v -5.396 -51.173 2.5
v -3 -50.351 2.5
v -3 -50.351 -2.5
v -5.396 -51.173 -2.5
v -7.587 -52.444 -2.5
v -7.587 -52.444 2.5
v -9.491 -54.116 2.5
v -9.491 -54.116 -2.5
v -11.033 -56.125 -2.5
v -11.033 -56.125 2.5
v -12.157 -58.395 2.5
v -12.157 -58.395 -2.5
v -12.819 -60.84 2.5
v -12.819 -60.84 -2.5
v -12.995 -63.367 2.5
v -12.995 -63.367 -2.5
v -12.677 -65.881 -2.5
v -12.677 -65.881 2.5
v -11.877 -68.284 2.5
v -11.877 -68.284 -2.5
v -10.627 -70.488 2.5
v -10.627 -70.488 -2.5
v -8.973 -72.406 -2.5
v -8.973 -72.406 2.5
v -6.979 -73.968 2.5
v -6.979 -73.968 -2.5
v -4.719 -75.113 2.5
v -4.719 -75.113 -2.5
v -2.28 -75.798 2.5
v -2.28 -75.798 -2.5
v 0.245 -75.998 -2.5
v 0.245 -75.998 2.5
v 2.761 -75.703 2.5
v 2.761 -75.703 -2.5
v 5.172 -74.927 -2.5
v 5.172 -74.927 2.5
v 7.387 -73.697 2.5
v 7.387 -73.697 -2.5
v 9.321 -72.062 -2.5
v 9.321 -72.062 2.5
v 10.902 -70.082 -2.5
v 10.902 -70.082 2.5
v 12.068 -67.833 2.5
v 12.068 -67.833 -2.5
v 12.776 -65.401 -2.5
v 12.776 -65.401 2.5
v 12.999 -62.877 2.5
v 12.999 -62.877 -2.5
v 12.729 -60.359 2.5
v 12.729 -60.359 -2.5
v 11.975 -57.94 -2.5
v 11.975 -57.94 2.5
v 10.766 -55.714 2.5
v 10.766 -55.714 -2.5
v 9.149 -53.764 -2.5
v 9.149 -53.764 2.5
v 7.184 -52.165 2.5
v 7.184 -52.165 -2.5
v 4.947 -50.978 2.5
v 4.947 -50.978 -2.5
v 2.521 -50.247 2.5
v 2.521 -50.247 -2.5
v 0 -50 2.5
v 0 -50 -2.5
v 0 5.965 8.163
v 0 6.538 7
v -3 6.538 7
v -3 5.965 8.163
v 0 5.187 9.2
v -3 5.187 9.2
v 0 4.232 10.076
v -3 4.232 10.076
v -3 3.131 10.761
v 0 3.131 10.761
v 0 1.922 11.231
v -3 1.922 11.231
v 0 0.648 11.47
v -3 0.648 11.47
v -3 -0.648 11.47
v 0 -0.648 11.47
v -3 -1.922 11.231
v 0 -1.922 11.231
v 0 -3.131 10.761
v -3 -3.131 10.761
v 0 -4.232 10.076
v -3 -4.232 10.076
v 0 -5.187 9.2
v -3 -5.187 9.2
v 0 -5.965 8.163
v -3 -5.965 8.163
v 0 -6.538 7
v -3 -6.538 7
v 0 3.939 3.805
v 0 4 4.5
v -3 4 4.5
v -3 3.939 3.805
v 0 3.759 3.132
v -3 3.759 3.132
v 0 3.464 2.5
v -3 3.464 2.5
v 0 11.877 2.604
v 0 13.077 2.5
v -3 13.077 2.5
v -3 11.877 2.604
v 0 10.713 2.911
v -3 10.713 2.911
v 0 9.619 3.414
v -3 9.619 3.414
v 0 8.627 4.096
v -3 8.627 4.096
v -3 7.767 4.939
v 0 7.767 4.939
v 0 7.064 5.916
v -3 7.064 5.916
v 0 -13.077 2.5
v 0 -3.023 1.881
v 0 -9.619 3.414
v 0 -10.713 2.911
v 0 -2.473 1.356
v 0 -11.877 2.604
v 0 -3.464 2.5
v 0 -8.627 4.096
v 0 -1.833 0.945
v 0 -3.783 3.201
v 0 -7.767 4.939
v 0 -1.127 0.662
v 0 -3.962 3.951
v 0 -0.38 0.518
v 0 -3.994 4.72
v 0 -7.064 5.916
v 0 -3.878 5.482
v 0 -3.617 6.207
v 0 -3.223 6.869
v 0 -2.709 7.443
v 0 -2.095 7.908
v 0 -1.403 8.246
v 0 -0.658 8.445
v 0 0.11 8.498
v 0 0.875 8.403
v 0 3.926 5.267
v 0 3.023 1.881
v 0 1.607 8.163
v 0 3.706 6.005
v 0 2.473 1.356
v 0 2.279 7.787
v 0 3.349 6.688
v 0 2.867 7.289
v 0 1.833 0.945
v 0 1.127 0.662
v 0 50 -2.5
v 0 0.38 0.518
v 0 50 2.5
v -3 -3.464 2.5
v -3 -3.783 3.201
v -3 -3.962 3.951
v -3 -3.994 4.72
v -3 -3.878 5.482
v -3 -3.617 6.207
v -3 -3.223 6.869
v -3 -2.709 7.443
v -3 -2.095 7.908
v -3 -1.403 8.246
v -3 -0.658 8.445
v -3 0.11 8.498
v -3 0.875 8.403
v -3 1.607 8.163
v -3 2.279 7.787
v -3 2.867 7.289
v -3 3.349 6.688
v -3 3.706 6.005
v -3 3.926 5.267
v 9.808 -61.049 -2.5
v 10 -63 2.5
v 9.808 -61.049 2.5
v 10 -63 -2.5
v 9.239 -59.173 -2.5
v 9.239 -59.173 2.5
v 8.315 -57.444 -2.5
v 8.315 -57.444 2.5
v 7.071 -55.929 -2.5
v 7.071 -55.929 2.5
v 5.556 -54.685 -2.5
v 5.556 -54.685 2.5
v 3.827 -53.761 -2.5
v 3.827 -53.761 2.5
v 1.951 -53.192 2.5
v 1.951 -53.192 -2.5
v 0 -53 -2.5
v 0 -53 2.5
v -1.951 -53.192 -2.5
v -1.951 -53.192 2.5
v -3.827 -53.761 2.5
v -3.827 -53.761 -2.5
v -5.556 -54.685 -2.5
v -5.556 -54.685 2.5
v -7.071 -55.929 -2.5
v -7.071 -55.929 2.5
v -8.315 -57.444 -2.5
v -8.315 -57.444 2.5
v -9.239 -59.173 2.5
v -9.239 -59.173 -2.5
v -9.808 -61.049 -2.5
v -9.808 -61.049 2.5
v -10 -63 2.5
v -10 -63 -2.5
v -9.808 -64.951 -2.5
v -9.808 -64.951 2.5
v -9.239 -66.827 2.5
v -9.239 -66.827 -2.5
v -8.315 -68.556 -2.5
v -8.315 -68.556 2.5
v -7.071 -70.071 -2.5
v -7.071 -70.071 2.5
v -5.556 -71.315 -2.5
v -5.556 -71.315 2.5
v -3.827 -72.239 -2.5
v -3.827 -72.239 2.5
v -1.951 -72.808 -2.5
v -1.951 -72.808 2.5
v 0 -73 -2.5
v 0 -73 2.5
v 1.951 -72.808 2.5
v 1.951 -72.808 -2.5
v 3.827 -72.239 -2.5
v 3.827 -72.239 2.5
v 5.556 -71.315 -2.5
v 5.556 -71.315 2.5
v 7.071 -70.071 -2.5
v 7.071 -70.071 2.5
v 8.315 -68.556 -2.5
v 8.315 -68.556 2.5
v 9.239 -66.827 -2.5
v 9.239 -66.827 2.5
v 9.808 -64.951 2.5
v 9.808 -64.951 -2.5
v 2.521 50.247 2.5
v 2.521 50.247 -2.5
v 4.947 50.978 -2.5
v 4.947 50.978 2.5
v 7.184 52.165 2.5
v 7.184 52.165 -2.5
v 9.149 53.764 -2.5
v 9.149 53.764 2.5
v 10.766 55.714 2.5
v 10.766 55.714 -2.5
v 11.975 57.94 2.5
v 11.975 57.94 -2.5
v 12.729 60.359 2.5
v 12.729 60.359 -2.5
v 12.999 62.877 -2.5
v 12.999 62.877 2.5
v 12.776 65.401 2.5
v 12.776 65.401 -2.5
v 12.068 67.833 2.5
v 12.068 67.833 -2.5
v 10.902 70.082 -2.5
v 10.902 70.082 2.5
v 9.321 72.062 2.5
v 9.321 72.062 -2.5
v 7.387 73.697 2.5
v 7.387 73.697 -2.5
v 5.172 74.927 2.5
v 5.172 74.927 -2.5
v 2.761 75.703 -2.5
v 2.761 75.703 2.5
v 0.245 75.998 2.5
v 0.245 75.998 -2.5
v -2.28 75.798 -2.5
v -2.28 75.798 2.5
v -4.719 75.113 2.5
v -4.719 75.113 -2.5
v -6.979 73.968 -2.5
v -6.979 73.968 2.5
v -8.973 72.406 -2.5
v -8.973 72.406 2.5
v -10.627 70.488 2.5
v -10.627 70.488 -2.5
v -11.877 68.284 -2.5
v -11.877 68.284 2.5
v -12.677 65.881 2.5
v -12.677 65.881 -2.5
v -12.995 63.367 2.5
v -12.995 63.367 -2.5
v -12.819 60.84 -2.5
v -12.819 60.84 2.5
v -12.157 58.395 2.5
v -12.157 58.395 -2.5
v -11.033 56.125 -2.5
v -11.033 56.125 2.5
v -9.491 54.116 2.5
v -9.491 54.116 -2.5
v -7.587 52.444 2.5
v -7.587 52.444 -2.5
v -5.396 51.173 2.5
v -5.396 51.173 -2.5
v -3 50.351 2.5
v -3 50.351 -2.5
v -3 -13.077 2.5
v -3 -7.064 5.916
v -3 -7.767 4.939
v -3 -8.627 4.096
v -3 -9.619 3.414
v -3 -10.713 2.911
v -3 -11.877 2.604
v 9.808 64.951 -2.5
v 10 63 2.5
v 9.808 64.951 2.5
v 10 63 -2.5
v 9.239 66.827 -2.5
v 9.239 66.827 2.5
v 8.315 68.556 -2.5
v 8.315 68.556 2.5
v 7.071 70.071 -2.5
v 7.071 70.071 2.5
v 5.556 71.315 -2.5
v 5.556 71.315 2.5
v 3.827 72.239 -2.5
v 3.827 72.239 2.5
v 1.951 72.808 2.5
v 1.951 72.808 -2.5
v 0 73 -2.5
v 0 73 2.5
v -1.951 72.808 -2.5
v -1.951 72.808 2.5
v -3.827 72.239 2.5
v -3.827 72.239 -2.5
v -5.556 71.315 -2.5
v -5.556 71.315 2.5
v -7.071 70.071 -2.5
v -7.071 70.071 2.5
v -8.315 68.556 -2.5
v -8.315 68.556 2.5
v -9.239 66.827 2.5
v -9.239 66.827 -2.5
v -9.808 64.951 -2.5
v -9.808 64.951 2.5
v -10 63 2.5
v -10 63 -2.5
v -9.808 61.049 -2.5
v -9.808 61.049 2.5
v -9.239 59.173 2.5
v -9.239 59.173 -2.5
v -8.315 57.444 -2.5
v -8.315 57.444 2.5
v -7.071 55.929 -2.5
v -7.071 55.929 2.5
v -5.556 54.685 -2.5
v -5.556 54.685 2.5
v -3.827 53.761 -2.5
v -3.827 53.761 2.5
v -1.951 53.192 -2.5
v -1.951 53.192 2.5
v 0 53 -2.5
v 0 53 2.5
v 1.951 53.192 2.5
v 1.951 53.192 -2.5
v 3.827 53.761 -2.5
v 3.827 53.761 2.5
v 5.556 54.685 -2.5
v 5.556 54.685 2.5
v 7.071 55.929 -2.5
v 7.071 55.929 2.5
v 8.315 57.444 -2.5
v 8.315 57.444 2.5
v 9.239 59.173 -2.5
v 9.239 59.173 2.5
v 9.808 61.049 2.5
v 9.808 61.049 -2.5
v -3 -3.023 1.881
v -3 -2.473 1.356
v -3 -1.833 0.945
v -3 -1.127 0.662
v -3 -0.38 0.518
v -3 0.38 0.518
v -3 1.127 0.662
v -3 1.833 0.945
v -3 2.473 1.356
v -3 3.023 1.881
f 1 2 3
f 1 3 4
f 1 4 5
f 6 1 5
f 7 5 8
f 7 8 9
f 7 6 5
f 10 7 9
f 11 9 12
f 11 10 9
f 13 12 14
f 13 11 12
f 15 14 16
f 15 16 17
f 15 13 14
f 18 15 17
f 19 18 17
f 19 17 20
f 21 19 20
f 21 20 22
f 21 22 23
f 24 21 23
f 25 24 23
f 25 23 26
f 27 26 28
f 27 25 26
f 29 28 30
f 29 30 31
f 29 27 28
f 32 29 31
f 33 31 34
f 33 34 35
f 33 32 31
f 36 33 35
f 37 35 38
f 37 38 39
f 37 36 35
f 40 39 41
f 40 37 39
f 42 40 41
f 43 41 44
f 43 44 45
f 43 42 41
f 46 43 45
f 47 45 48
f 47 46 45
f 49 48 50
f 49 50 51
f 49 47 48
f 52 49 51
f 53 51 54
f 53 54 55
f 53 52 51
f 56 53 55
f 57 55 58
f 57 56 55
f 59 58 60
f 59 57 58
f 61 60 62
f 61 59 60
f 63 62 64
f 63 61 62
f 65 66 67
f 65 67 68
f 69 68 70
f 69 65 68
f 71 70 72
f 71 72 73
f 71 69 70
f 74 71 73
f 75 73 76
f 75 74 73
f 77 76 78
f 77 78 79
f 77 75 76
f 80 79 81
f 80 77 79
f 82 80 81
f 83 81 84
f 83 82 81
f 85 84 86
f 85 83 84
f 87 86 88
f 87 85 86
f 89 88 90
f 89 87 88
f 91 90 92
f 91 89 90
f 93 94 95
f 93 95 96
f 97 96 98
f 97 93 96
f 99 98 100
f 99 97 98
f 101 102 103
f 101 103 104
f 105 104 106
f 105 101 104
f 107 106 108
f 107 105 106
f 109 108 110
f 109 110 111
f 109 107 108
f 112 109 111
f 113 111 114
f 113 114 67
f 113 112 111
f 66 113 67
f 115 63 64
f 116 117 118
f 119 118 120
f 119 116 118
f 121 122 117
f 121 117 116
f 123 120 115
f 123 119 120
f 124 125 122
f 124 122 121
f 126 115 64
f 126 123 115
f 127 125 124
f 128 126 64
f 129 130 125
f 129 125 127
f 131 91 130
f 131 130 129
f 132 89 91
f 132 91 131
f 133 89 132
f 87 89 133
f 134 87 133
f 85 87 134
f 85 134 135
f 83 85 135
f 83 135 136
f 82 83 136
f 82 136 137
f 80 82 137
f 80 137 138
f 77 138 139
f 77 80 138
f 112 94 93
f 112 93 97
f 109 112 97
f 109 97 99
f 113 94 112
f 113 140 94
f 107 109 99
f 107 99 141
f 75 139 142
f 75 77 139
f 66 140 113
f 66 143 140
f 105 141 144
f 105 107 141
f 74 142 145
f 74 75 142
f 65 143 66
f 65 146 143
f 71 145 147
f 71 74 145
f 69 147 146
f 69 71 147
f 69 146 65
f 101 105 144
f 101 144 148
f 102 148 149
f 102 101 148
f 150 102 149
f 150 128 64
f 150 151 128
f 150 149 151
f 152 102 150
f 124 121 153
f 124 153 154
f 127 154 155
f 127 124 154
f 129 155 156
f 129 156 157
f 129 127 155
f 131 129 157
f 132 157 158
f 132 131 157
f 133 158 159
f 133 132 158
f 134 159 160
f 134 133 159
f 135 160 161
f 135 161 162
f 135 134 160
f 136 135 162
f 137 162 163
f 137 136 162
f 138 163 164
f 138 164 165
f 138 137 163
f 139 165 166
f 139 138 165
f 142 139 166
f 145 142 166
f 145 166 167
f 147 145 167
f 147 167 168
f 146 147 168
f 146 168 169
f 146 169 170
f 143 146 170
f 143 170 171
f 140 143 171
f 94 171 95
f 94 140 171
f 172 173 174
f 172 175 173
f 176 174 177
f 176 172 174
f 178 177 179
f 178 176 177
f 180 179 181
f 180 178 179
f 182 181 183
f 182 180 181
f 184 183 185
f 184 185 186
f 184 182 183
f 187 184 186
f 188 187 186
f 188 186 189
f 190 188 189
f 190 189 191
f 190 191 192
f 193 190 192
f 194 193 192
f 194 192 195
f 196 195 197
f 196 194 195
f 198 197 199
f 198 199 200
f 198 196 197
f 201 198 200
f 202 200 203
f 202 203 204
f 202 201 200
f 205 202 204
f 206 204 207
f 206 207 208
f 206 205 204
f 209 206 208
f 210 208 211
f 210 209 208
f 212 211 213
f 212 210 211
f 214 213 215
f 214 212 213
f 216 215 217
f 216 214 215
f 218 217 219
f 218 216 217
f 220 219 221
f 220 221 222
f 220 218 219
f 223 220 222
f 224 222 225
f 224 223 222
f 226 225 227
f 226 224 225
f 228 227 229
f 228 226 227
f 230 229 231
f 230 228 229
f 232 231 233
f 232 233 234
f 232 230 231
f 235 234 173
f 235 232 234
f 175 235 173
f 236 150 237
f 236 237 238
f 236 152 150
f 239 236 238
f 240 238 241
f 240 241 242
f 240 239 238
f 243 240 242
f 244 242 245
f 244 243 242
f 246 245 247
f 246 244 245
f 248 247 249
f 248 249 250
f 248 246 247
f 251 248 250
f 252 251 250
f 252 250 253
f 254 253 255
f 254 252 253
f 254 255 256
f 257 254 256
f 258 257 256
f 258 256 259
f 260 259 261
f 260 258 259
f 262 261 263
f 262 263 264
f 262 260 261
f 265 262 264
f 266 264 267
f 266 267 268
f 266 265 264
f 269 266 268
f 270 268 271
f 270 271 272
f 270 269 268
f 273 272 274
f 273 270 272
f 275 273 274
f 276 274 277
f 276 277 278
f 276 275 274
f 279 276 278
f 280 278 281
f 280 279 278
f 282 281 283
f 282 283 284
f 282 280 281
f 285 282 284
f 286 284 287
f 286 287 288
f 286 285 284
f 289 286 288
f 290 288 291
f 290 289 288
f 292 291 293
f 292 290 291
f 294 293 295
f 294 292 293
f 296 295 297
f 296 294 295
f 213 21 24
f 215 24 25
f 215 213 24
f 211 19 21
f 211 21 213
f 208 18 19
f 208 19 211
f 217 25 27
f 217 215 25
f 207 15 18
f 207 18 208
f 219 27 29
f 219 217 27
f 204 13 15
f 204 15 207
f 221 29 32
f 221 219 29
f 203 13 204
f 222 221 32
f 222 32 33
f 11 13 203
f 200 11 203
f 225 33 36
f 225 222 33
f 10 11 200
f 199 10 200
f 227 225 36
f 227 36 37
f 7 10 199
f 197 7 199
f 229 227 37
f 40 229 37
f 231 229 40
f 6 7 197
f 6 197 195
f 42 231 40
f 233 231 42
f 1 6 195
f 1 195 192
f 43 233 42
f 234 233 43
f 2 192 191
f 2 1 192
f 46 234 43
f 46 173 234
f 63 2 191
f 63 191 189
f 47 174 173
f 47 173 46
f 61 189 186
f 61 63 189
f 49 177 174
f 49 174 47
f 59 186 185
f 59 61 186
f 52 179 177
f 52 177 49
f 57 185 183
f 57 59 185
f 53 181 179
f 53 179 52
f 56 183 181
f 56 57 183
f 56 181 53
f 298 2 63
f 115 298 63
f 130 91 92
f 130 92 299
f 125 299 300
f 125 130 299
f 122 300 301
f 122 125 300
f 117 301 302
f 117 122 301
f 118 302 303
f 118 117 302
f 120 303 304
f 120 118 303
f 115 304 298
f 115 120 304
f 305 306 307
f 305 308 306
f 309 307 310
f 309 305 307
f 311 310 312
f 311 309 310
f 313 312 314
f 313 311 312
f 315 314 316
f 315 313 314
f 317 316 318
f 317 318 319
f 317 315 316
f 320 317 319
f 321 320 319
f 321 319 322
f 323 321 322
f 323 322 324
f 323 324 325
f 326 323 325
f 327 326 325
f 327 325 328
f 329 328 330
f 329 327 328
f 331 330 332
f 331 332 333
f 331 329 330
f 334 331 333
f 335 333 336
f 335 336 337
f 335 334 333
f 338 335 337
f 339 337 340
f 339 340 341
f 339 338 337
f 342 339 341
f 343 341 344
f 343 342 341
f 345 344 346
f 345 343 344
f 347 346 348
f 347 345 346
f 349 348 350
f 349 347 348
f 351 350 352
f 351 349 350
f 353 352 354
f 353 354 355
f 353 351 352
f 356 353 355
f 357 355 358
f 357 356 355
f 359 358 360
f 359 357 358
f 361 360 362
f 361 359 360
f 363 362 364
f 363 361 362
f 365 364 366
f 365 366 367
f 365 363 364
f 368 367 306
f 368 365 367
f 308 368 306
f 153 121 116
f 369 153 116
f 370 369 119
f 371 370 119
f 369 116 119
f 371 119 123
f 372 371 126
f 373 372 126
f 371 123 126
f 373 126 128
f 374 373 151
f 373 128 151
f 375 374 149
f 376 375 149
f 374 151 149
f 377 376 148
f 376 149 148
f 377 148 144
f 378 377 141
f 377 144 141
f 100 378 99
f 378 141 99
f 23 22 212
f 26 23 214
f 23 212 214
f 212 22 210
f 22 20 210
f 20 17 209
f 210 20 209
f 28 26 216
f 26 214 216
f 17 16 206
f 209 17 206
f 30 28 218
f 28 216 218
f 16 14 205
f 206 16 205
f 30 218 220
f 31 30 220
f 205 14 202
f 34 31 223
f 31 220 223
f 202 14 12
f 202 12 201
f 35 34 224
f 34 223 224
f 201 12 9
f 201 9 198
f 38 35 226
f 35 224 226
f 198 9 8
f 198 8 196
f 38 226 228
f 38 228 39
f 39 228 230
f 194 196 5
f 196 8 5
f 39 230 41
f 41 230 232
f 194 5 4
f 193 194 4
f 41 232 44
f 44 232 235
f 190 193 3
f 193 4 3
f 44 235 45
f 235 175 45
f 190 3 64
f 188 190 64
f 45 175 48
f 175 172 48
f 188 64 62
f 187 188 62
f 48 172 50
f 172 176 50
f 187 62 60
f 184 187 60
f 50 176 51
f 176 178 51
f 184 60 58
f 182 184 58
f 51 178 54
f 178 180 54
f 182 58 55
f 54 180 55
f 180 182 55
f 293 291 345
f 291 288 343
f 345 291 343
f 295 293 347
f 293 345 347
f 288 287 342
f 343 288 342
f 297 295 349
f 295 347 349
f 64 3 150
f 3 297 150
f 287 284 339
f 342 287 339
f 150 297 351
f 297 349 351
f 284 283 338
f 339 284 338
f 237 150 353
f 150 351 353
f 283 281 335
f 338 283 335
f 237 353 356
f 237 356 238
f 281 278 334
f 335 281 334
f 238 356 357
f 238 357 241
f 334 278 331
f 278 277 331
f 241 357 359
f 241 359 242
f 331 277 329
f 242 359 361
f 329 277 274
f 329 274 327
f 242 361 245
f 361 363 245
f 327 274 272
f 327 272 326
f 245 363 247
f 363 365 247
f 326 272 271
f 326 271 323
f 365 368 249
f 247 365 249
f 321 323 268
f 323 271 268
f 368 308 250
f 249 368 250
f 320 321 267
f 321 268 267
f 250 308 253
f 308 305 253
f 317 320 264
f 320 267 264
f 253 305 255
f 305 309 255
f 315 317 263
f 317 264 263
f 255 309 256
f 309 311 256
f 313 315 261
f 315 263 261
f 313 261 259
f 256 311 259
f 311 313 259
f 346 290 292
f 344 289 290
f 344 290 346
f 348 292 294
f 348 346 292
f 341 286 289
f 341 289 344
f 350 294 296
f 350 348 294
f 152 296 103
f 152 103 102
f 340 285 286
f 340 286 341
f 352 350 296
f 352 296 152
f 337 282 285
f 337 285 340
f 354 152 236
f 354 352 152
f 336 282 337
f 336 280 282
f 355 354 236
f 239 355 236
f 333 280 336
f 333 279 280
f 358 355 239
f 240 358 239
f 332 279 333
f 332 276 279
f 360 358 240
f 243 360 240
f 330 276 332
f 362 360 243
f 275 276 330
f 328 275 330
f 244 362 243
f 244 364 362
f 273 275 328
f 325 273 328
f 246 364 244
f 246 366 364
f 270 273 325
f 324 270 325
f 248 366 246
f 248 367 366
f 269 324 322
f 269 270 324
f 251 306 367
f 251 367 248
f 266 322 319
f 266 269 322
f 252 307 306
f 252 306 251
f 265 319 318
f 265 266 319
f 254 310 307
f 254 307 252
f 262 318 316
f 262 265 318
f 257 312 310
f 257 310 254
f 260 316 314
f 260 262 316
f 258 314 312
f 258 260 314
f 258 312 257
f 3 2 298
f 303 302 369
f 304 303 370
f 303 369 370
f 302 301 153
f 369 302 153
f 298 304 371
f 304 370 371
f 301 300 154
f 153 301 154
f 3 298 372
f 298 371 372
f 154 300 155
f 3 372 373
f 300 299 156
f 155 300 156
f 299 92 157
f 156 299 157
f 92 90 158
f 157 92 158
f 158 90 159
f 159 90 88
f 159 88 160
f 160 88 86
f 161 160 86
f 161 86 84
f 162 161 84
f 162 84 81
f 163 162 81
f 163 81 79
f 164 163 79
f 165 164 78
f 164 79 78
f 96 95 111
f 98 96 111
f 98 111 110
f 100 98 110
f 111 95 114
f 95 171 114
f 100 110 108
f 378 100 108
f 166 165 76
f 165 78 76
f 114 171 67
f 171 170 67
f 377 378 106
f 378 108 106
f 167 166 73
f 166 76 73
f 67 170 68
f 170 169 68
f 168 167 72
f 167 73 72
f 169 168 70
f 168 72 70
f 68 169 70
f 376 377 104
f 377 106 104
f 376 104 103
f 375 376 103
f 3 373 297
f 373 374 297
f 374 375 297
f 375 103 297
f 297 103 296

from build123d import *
from build123d import SkipClean  # not in build123d's __all__

# Parameters (mm, degrees)
F0_R     = 10
F1_DEPTH = 2.5
F3_DEPTH = 3
F4_DEPTH = 25


# Not quite as in the source:
# - a feature names something its author has since deleted; it is built from what else it names


with BuildPart() as f1:
    # F0 (on Top) → F1 (new body, symmetric)
    with BuildSketch(Plane.XY):
        with BuildLine():
            Line((-3, 50.3508893593), (-3, -50.3508893593))
            ThreePointArc((-3, -50.3508893593), (1.5102254254, -75.9119796764), (0, -50))
            Line((0, -50), (0, 50))
            ThreePointArc((0, 50), (1.5102254254, 75.9119796764), (-3, 50.3508893593))
        make_face()
        with Locations((0, -63)):
            Circle(F0_R, mode=Mode.SUBTRACT)
        with Locations((0, 63)):
            Circle(F0_R, mode=Mode.SUBTRACT)
    extrude(amount=F1_DEPTH, both=True)

    # F2 (on face) → F3 (join, through all)
    with BuildSketch(Plane.YZ):
        with BuildLine():
            ThreePointArc((-3.4641016151, 2.5), (-1.0352761804, 8.3637033052), (4, 4.5))
            ThreePointArc((4, 4.5), (3.8637033052, 3.4647238196), (3.4641016151, 2.5))
            Line((3.4641016151, 2.5), (13.0766968306, 2.5))
            ThreePointArc((13.0766968306, 2.5), (9.108069864, 3.7337187027), (6.5383484153, 7))
            ThreePointArc((6.5383484153, 7), (0, 11.5), (-6.5383484153, 7))
            ThreePointArc((-6.5383484153, 7), (-9.108069864, 3.7337187027), (-13.0766968306, 2.5))
            Line((-13.0766968306, 2.5), (-3.4641016151, 2.5))
        make_face()
        with BuildLine():
            ThreePointArc((3.4641016151, 2.5), (0, 0.5), (-3.4641016151, 2.5))
            Line((-3.4641016151, 2.5), (-13.0766968306, 2.5))
            Line((-13.0766968306, 2.5), (-13.0766968306, -2.5))
            Line((-13.0766968306, -2.5), (13.0766968306, -2.5))
            Line((13.0766968306, -2.5), (13.0766968306, 2.5))
            Line((13.0766968306, 2.5), (3.4641016151, 2.5))
        make_face()
    extrude(amount=-F3_DEPTH)

    # F2 (on face) → F4 (cut)
    with BuildSketch(Plane.YZ):
        with BuildLine():
            Line((3.4641016151, 2.5), (-3.4641016151, 2.5))
            ThreePointArc((-3.4641016151, 2.5), (0, 0.5), (3.4641016151, 2.5))
        make_face()
    with SkipClean():  # cleaning this boolean's faces spoils the solid; the shape is the same uncleaned
        extrude(amount=-F4_DEPTH, mode=Mode.SUBTRACT)


solid = f1.part
